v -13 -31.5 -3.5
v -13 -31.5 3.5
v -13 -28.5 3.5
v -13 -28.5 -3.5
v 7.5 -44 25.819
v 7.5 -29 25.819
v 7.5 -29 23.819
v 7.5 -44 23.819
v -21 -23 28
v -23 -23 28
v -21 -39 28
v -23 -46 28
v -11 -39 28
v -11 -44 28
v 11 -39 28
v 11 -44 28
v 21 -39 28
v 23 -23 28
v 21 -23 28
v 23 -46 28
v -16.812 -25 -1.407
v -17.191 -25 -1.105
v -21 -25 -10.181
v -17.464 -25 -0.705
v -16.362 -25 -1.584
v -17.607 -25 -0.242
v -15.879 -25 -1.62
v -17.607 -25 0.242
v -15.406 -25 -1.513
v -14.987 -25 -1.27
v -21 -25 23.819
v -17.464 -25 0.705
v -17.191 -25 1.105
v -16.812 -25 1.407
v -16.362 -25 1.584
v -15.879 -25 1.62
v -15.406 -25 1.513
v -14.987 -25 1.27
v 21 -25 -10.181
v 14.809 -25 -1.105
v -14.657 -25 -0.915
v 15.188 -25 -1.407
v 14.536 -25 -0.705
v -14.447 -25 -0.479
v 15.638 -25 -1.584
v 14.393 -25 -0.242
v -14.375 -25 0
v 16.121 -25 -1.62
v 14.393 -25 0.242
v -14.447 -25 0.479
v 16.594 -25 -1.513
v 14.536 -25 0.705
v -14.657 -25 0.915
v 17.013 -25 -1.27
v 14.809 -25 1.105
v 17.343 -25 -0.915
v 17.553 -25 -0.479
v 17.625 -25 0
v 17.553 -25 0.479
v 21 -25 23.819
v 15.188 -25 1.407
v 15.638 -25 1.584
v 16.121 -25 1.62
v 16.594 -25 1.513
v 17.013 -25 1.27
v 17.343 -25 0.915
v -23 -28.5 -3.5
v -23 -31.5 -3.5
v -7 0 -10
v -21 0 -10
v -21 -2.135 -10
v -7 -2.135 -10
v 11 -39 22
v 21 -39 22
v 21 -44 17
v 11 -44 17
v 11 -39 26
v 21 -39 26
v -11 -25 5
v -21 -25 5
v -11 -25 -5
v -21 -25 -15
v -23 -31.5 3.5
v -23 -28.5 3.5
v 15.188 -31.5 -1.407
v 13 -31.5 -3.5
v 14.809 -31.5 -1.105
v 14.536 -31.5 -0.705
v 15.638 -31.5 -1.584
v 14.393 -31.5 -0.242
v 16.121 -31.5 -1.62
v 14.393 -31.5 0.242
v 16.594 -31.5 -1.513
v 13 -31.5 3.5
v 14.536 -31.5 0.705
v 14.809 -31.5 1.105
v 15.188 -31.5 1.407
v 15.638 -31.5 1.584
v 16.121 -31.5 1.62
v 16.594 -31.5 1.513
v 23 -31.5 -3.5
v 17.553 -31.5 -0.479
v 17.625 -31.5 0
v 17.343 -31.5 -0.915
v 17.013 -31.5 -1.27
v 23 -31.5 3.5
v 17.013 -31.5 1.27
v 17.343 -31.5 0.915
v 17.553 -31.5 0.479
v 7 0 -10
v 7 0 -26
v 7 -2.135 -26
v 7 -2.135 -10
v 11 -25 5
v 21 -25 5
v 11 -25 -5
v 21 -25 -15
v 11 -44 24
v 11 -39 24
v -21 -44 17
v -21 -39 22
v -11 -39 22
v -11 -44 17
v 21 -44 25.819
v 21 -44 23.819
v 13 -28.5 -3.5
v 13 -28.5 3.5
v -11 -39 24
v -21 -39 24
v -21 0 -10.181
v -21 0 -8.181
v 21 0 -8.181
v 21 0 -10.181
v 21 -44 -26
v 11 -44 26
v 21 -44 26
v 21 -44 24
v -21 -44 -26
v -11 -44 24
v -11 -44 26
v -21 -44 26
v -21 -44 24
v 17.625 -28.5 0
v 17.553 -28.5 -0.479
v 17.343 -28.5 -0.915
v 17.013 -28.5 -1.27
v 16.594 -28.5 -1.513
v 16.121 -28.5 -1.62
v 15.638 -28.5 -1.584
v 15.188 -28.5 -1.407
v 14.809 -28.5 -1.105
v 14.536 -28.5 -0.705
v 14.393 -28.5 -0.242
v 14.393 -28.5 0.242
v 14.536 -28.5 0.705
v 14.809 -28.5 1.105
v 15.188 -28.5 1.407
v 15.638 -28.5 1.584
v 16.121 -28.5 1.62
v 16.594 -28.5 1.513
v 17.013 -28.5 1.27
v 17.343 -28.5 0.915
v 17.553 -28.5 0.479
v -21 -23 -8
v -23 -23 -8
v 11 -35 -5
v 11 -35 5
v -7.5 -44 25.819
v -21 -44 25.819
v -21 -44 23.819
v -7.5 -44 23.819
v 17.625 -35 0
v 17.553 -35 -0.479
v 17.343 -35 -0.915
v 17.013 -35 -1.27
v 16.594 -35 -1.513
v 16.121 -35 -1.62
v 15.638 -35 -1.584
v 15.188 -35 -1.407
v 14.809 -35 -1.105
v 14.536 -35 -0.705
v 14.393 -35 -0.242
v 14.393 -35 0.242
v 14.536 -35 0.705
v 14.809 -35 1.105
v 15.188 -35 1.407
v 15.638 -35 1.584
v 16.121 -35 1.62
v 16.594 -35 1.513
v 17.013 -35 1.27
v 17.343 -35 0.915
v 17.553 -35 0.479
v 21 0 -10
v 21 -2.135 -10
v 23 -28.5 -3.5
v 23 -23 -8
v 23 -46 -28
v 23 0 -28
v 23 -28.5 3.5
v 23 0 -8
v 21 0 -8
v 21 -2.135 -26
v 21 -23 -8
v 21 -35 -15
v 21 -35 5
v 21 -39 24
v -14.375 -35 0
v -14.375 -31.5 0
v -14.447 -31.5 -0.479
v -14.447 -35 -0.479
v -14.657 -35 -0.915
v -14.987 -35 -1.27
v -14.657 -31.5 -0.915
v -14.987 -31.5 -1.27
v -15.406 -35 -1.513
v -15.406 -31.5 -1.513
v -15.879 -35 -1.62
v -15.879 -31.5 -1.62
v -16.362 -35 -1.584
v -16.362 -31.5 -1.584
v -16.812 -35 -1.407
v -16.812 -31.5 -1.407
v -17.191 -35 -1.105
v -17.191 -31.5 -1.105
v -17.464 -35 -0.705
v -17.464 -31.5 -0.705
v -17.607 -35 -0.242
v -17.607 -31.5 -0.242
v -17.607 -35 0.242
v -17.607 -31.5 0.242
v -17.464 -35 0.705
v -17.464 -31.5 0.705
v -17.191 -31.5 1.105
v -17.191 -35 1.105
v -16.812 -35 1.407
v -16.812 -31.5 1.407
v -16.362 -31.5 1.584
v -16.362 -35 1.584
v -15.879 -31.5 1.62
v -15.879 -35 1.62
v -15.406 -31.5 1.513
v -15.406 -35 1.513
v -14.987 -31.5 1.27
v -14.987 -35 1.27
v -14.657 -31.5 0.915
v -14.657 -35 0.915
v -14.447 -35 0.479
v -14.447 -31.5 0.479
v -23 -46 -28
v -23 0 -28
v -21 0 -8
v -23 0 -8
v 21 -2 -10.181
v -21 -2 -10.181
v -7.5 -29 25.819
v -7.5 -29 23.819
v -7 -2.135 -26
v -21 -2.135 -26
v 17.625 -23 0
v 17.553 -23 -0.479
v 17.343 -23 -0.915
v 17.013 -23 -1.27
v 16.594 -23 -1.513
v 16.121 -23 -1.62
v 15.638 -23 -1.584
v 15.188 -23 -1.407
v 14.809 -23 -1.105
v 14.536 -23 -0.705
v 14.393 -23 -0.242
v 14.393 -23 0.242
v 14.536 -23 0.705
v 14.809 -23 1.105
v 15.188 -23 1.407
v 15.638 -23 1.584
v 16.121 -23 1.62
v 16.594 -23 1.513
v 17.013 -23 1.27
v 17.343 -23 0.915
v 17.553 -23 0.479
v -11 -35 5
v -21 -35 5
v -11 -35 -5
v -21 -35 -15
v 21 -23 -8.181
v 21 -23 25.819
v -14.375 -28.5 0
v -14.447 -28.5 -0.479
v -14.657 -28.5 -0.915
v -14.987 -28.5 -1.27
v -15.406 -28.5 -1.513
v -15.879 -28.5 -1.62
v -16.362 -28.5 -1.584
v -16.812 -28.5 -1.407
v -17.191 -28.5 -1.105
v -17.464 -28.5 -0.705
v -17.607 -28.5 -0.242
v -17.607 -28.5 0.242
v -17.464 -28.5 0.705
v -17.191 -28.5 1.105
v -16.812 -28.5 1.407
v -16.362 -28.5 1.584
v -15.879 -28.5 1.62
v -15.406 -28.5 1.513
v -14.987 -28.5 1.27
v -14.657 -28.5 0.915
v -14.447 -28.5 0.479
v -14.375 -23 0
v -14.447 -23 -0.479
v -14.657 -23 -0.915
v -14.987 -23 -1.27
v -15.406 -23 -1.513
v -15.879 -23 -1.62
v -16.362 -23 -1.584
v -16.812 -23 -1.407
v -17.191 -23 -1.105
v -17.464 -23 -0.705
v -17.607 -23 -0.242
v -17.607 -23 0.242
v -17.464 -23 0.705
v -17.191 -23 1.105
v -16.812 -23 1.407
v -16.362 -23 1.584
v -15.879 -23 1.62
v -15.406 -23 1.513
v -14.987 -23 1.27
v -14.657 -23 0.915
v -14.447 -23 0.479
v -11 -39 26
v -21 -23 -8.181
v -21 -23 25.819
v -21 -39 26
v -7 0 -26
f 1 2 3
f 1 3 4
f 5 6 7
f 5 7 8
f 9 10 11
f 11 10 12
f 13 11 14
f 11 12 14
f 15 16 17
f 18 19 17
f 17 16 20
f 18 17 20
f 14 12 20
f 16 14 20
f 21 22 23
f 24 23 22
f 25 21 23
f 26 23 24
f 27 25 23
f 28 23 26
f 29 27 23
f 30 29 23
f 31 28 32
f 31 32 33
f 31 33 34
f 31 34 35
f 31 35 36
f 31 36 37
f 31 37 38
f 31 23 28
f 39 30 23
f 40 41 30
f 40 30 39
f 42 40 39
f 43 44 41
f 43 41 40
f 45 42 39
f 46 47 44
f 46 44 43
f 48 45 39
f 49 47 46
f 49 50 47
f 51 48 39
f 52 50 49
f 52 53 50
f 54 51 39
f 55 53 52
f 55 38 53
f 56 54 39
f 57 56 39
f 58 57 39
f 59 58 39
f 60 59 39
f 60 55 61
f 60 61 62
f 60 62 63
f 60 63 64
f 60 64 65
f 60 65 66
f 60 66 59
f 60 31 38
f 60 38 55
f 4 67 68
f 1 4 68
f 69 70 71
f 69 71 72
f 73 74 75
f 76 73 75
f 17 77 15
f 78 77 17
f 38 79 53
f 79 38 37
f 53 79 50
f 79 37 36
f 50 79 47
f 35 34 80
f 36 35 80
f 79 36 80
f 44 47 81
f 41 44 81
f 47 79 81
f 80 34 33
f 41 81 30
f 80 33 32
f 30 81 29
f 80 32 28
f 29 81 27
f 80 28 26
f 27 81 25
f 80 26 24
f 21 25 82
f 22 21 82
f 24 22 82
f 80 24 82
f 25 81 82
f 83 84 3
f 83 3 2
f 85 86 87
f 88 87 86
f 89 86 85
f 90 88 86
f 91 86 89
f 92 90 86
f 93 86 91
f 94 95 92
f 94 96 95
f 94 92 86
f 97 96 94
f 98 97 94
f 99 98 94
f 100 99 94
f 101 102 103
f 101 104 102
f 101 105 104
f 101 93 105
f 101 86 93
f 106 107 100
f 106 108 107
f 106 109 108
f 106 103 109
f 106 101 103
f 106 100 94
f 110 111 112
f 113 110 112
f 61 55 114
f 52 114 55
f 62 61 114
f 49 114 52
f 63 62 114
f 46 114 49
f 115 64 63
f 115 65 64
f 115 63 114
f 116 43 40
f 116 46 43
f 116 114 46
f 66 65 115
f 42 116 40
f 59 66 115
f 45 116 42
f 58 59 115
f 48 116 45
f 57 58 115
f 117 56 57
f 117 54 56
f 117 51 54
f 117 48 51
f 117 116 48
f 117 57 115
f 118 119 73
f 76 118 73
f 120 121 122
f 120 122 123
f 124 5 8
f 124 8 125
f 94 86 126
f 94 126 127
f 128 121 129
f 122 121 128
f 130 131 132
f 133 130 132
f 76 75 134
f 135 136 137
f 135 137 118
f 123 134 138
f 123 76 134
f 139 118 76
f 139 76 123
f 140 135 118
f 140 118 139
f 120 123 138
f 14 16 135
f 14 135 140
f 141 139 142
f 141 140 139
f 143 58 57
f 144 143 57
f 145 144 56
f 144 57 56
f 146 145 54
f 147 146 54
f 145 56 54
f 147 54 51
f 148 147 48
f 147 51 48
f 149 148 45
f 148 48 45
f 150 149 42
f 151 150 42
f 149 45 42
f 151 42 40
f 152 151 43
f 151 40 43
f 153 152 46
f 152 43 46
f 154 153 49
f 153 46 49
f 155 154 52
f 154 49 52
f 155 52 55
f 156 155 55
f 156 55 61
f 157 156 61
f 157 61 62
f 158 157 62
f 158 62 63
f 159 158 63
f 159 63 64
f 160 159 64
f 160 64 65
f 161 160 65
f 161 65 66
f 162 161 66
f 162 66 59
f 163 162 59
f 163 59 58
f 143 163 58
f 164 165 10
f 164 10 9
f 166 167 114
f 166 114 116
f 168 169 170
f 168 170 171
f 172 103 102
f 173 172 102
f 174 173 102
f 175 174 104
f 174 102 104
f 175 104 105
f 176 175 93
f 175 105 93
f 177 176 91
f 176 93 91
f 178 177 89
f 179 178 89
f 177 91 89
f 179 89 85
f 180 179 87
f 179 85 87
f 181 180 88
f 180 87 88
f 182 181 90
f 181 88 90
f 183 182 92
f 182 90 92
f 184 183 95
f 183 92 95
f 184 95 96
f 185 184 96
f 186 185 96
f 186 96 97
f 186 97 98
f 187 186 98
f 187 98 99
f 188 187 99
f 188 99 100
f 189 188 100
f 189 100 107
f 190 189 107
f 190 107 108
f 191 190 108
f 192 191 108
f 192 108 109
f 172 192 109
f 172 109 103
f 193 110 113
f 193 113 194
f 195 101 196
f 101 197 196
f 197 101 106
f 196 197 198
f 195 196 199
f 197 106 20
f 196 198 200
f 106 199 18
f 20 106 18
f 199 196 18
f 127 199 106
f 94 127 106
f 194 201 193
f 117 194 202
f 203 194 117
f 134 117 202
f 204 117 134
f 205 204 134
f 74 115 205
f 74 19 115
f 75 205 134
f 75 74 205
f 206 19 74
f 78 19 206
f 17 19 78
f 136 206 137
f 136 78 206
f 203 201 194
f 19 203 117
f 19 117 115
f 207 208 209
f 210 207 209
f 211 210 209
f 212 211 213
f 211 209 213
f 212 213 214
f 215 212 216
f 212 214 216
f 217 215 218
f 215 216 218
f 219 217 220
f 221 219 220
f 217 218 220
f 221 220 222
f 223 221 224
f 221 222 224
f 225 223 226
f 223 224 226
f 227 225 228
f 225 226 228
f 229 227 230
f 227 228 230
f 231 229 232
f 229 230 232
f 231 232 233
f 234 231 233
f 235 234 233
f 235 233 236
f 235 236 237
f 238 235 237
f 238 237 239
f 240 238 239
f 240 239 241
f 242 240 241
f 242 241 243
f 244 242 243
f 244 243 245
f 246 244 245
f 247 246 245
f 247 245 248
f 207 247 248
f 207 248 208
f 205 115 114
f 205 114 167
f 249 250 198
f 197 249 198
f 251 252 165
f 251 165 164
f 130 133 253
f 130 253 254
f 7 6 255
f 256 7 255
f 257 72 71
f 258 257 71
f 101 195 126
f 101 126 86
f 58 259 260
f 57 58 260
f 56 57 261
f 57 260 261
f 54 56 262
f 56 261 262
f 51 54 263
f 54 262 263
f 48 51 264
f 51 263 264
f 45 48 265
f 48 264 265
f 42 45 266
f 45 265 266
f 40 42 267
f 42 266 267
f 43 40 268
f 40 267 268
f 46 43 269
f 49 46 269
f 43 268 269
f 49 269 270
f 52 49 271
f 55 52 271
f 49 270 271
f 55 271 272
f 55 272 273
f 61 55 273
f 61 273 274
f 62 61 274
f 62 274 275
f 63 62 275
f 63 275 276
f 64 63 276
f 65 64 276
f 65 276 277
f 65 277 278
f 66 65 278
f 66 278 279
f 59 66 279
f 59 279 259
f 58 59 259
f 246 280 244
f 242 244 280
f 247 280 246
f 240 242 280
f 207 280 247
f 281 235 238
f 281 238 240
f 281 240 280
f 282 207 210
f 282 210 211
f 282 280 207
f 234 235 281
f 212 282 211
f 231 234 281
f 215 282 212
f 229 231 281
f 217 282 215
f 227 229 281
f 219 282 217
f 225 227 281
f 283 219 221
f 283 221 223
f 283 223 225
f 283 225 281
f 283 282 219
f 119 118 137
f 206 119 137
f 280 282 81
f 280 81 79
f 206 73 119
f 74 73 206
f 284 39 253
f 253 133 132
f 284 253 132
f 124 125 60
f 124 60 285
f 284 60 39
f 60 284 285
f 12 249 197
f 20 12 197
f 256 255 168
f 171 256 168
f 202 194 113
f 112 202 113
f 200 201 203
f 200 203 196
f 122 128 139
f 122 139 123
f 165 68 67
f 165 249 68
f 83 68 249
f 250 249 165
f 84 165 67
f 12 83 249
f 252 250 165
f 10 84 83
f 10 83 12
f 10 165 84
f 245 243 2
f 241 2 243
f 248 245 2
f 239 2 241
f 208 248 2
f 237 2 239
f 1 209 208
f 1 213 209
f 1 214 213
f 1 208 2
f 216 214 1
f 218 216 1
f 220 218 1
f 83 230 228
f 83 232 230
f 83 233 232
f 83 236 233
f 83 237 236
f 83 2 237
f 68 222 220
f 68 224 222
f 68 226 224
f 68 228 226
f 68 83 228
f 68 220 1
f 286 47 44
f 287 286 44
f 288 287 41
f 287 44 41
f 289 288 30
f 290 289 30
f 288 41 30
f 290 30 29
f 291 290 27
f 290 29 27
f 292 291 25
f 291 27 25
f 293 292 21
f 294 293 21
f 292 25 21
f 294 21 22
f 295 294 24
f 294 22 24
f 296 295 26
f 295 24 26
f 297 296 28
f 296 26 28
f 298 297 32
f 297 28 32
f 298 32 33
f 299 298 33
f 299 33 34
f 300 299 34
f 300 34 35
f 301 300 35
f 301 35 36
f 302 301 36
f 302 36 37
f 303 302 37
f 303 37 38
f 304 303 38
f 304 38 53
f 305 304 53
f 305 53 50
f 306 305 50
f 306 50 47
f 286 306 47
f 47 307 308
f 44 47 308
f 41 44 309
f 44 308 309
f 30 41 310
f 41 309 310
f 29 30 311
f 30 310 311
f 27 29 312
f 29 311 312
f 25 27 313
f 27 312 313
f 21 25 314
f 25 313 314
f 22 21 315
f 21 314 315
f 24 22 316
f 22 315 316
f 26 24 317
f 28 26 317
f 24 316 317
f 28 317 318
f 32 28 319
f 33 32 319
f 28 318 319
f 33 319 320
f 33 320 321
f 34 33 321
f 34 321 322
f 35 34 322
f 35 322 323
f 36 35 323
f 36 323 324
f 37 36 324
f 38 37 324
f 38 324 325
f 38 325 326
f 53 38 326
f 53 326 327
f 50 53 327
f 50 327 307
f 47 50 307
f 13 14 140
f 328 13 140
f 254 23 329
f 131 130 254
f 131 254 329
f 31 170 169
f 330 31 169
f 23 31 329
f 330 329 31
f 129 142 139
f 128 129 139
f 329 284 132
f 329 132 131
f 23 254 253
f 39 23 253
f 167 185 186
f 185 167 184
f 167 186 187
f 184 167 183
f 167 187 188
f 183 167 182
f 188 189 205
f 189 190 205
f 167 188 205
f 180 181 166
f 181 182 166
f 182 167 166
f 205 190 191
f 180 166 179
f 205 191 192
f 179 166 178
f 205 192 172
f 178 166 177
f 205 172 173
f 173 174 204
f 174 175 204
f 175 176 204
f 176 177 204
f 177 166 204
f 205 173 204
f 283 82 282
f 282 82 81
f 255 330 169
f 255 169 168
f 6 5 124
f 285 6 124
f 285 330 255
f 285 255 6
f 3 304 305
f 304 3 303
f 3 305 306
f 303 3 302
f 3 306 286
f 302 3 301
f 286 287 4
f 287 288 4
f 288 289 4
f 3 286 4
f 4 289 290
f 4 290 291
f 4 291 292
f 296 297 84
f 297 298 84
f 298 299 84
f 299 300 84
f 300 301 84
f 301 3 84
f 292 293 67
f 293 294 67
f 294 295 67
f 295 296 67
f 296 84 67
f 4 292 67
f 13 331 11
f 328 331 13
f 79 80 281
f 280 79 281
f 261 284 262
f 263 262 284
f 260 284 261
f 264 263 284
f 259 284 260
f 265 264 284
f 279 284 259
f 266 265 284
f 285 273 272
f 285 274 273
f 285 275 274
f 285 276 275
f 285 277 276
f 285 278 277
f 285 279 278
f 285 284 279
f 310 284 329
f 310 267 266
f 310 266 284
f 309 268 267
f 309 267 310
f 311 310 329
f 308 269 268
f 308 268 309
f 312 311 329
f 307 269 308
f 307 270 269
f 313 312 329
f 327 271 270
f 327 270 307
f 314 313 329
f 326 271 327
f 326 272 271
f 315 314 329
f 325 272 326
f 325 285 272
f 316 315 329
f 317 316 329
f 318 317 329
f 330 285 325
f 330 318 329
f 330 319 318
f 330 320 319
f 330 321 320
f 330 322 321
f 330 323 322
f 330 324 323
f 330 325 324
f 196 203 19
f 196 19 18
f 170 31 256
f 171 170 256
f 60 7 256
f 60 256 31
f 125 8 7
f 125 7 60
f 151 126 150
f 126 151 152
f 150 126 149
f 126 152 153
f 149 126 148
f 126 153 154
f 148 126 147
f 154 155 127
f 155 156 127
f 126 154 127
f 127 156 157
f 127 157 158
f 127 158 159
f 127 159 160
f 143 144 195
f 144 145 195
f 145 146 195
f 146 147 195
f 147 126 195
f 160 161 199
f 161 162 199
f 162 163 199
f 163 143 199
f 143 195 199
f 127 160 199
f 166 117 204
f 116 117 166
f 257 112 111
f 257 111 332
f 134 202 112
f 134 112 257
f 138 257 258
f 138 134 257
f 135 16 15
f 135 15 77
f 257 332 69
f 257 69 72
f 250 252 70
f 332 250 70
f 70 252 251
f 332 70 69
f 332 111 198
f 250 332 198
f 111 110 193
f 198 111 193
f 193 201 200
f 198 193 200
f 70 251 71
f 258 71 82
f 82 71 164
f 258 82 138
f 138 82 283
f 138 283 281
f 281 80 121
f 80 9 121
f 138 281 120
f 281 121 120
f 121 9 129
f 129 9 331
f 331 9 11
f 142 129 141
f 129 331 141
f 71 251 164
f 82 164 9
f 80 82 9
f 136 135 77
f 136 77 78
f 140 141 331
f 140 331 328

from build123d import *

# Parameters (mm, degrees)
SKETCH_W        = 46
SKETCH_H        = 56
PAD_DEPTH       = 46
SKETCH001_W     = 46
SKETCH001_H     = 36
POCKET_DEPTH    = 23
SKETCH002_W     = 42
SKETCH002_H     = 41.864729
POCKET001_DEPTH = 54
SKETCH003_W     = 10
SKETCH003_H     = 2
PAD001_DEPTH    = 5
SKETCH004_W     = 10
SKETCH004_H     = 2
PAD002_DEPTH    = 5
PAD003_DEPTH    = 5
PAD004_DEPTH    = 10
PAD005_DEPTH    = 10
SKETCH007_W     = 14
SKETCH007_H     = 2.135271
POCKET002_DEPTH = 18
SKETCH008_W     = 10
SKETCH008_H     = 10
PAD006_DEPTH    = 10
SKETCH009_W     = 10
SKETCH009_H     = 10
PAD007_DEPTH    = 10
SKETCH010_W     = 7
SKETCH010_H     = 3
POCKET003_DEPTH = 10
SKETCH011_W     = 7
SKETCH011_H     = 3
POCKET004_DEPTH = 10
SKETCH012_R     = 1.625
POCKET005_DEPTH = 10
PAD008_DEPTH    = 10
PAD009_DEPTH    = 10
SKETCH019_W     = 14
SKETCH019_H     = 2
POCKET009_DEPTH = 3
SKETCH015_W     = 42
SKETCH015_H     = 52
PAD010_DEPTH    = 44
SKETCH016_W     = 42
SKETCH016_H     = 50
POCKET006_DEPTH = 19
SKETCH017_W     = 42
SKETCH017_H     = 23
POCKET007_DEPTH = 34
POCKET008_DEPTH = 2
SKETCH020_W     = 42
SKETCH020_H     = 16
POCKET010_DEPTH = 23
SKETCH021_R     = 1.625
POCKET011_DEPTH = 5
SKETCH022_W     = 15
SKETCH022_H     = 15
POCKET012_DEPTH = 5


with BuildPart() as main_body:
    # Sketch → Pad (new body)
    with BuildSketch(Plane.XZ):
        Rectangle(SKETCH_W, SKETCH_H)
    extrude(amount=PAD_DEPTH)

    # Sketch001 (on Face5 of Pad) → Pocket (cut)
    with BuildSketch(Plane(origin=(0, 0, 0), x_dir=(1, 0, 0), z_dir=(0, 1, 0))):
        with Locations((0, -10)):
            Rectangle(SKETCH001_W, SKETCH001_H)
    extrude(amount=-POCKET_DEPTH, mode=Mode.SUBTRACT)

    # Sketch002 (on Face7 of Pocket) → Pocket001 (cut)
    with BuildSketch(Plane(origin=(0, 0, 28), x_dir=(-1, 0, 0), z_dir=(0, 0, 1))):
        with Locations((0, 23.0676355)):
            Rectangle(SKETCH002_W, SKETCH002_H)
    extrude(amount=-POCKET001_DEPTH, mode=Mode.SUBTRACT)

    # Sketch003 (on Face13 of Pocket001) → Pad001 (join)
    with BuildSketch(Plane(origin=(0, -44, 0), x_dir=(1, 0, 0), z_dir=(0, 1, 0))):
        with Locations((-16, -27)):
            Rectangle(SKETCH003_W, SKETCH003_H)
        with Locations((16, -27)):
            Rectangle(SKETCH003_W, SKETCH003_H)
    extrude(amount=PAD001_DEPTH)

    # Sketch004 (on Face12 of Pad001) → Pad002 (join)
    with BuildSketch(Plane(origin=(0, -44, 0), x_dir=(1, 0, 0), z_dir=(0, 1, 0))):
        with Locations((-16, -23)):
            Rectangle(SKETCH004_W, SKETCH004_H)
        with Locations((16, -23)):
            Rectangle(SKETCH004_W, SKETCH004_H)
    extrude(amount=PAD002_DEPTH)

    # Sketch004 (on Face12 of Pad001) → Pad003 (join)
    with BuildSketch(Plane(origin=(0, -44, 0), x_dir=(1, 0, 0), z_dir=(0, 1, 0))):
        with Locations((-16, -23)):
            Rectangle(SKETCH004_W, SKETCH004_H)
        with Locations((16, -23)):
            Rectangle(SKETCH004_W, SKETCH004_H)
    extrude(amount=PAD003_DEPTH)

    # Sketch005 (on Face8 of Pad003) → Pad004 (join)
    with BuildSketch(Plane(origin=(-21, 0, 0), x_dir=(0, 0, 1), z_dir=(1, 0, 0))):
        Polygon((22, 39), (17, 44), (22, 44), align=None)
    extrude(amount=PAD004_DEPTH)

    # Sketch006 (on Face10 of Pad004) → Pad005 (join)
    with BuildSketch(Plane(origin=(21, 0, 0), x_dir=(0, 0, -1), z_dir=(-1, 0, 0))):
        Polygon((-17.0000000001, 44), (-22, 44), (-22, 39), align=None)
    extrude(amount=PAD005_DEPTH)

    # Sketch007 (on Face3 of Pad005) → Pocket002 (cut)
    with BuildSketch(Plane(origin=(0, 0, -8), x_dir=(-1, 0, 0), z_dir=(0, 0, 1))):
        with Locations((0, 1.0676355)):
            Rectangle(SKETCH007_W, SKETCH007_H)
    extrude(amount=-POCKET002_DEPTH, mode=Mode.SUBTRACT)

    # Sketch008 (on Face15 of Pocket002) → Pad006 (join)
    with BuildSketch(Plane(origin=(21, 0, 0), x_dir=(0, 0, -1), z_dir=(-1, 0, 0))):
        with Locations((0, 30)):
            Rectangle(SKETCH008_W, SKETCH008_H)
    extrude(amount=PAD006_DEPTH)

    # Sketch009 (on Face8 of Pad006) → Pad007 (join)
    with BuildSketch(Plane(origin=(-21, 0, 0), x_dir=(0, 0, 1), z_dir=(1, 0, 0))):
        with Locations((0, 30)):
            Rectangle(SKETCH009_W, SKETCH009_H)
    extrude(amount=PAD007_DEPTH)

    # Sketch010 (on Face1 of Pad007) → Pocket003 (cut)
    with BuildSketch(Plane(origin=(-23, 0, 0), x_dir=(0, 0, -1), z_dir=(-1, 0, 0))):
        with Locations((0, 30)):
            Rectangle(SKETCH010_W, SKETCH010_H)
    extrude(amount=-POCKET003_DEPTH, mode=Mode.SUBTRACT)

    # Sketch011 (on Face13 of Pocket003) → Pocket004 (cut)
    with BuildSketch(Plane(origin=(23, 0, 0), x_dir=(0, 0, 1), z_dir=(1, 0, 0))):
        with Locations((0, 30)):
            Rectangle(SKETCH011_W, SKETCH011_H)
    extrude(amount=-POCKET004_DEPTH, mode=Mode.SUBTRACT)

    # Sketch012 (on Face34 of Pocket004) → Pocket005 (cut)
    with BuildSketch(Plane(origin=(0, -25, 0), x_dir=(1, 0, 0), z_dir=(0, 1, 0))):
        with Locations((-16, 0)):
            Circle(SKETCH012_R)
        with Locations((16, 0)):
            Circle(SKETCH012_R)
    extrude(amount=-POCKET005_DEPTH, mode=Mode.SUBTRACT)

    # Sketch013 (on Face49 of Pocket005) → Pad008 (join)
    with BuildSketch(Plane(origin=(0, -25, 0), x_dir=(1, 0, 0), z_dir=(0, 1, 0))):
        Polygon((21, 5), (21, 15), (11, 5), align=None)
    extrude(amount=-PAD008_DEPTH)

    # Sketch014 (on Face36 of Pad008) → Pad009 (join)
    with BuildSketch(Plane(origin=(0, -25, 0), x_dir=(1, 0, 0), z_dir=(0, 1, 0))):
        Polygon((-21, 5), (-21, 15), (-11, 5), align=None)
    extrude(amount=-PAD009_DEPTH)

    # Sketch019 (on Face6 of Pad009) → Pocket009 (cut)
    with BuildSketch(Plane(origin=(0, 0, 0), x_dir=(1, 0, 0), z_dir=(0, 1, 0))):
        with Locations((14, 9)):
            Rectangle(SKETCH019_W, SKETCH019_H)
        with Locations((-14, 9)):
            Rectangle(SKETCH019_W, SKETCH019_H)
    extrude(amount=-POCKET009_DEPTH, mode=Mode.SUBTRACT)


with BuildPart() as body:
    # Sketch015 → Pad010 (new body)
    with BuildSketch(Plane.XZ):
        with Locations((0, -0.1812561845)):
            Rectangle(SKETCH015_W, SKETCH015_H)
    extrude(amount=PAD010_DEPTH)

    # Sketch016 (on Face6 of Pad010) → Pocket006 (cut)
    with BuildSketch(Plane.XZ.offset(44)):
        with Locations((0, -1.1812561845)):
            Rectangle(SKETCH016_W, SKETCH016_H)
    extrude(amount=-POCKET006_DEPTH, mode=Mode.SUBTRACT)

    # Sketch017 (on Face6 of Pocket006) → Pocket007 (cut)
    with BuildSketch(Plane(origin=(0, 0, 25.8187438155), x_dir=(-1, 0, 0), z_dir=(0, 0, 1))):
        with Locations((0, 11.5)):
            Rectangle(SKETCH017_W, SKETCH017_H)
    extrude(amount=-POCKET007_DEPTH, mode=Mode.SUBTRACT)

    # Sketch018 (on Face2 of Pocket007) → Pocket008 (cut)
    with BuildSketch(Plane(origin=(0, 0, 0), x_dir=(1, 0, 0), z_dir=(0, 1, 0))):
        Polygon((-21, 10.1812561845), (-21, 26.1812561845), (-7.015497, 26.1812561845), (6.993247, 26.1812561845), (21, 26.1812561845), (21, 10.1812561845), align=None)
    extrude(amount=-POCKET008_DEPTH, mode=Mode.SUBTRACT)

    # Sketch020 (on Face2 of Pocket008) → Pocket010 (cut)
    with BuildSketch(Plane(origin=(0, -2, 0), x_dir=(1, 0, 0), z_dir=(0, 1, 0))):
        with Locations((0, 18.181256)):
            Rectangle(SKETCH020_W, SKETCH020_H)
    extrude(amount=-POCKET010_DEPTH, mode=Mode.SUBTRACT)

    # Sketch021 (on Face5 of Pocket010) → Pocket011 (cut)
    with BuildSketch(Plane(origin=(0, -23, 0), x_dir=(1, 0, 0), z_dir=(0, 1, 0))):
        with Locations((16, 0)):
            Circle(SKETCH021_R)
        with Locations((-16, 0)):
            Circle(SKETCH021_R)
    extrude(amount=-POCKET011_DEPTH, mode=Mode.SUBTRACT)

    # Sketch022 (on Face5 of Pocket011) → Pocket012 (cut)
    with BuildSketch(Plane(origin=(0, 0, 25.8187438155), x_dir=(-1, 0, 0), z_dir=(0, 0, 1))):
        with Locations((0, 36.5)):
            Rectangle(SKETCH022_W, SKETCH022_H)
    extrude(amount=-POCKET012_DEPTH, mode=Mode.SUBTRACT)


solid = Compound([main_body.part, body.part])
